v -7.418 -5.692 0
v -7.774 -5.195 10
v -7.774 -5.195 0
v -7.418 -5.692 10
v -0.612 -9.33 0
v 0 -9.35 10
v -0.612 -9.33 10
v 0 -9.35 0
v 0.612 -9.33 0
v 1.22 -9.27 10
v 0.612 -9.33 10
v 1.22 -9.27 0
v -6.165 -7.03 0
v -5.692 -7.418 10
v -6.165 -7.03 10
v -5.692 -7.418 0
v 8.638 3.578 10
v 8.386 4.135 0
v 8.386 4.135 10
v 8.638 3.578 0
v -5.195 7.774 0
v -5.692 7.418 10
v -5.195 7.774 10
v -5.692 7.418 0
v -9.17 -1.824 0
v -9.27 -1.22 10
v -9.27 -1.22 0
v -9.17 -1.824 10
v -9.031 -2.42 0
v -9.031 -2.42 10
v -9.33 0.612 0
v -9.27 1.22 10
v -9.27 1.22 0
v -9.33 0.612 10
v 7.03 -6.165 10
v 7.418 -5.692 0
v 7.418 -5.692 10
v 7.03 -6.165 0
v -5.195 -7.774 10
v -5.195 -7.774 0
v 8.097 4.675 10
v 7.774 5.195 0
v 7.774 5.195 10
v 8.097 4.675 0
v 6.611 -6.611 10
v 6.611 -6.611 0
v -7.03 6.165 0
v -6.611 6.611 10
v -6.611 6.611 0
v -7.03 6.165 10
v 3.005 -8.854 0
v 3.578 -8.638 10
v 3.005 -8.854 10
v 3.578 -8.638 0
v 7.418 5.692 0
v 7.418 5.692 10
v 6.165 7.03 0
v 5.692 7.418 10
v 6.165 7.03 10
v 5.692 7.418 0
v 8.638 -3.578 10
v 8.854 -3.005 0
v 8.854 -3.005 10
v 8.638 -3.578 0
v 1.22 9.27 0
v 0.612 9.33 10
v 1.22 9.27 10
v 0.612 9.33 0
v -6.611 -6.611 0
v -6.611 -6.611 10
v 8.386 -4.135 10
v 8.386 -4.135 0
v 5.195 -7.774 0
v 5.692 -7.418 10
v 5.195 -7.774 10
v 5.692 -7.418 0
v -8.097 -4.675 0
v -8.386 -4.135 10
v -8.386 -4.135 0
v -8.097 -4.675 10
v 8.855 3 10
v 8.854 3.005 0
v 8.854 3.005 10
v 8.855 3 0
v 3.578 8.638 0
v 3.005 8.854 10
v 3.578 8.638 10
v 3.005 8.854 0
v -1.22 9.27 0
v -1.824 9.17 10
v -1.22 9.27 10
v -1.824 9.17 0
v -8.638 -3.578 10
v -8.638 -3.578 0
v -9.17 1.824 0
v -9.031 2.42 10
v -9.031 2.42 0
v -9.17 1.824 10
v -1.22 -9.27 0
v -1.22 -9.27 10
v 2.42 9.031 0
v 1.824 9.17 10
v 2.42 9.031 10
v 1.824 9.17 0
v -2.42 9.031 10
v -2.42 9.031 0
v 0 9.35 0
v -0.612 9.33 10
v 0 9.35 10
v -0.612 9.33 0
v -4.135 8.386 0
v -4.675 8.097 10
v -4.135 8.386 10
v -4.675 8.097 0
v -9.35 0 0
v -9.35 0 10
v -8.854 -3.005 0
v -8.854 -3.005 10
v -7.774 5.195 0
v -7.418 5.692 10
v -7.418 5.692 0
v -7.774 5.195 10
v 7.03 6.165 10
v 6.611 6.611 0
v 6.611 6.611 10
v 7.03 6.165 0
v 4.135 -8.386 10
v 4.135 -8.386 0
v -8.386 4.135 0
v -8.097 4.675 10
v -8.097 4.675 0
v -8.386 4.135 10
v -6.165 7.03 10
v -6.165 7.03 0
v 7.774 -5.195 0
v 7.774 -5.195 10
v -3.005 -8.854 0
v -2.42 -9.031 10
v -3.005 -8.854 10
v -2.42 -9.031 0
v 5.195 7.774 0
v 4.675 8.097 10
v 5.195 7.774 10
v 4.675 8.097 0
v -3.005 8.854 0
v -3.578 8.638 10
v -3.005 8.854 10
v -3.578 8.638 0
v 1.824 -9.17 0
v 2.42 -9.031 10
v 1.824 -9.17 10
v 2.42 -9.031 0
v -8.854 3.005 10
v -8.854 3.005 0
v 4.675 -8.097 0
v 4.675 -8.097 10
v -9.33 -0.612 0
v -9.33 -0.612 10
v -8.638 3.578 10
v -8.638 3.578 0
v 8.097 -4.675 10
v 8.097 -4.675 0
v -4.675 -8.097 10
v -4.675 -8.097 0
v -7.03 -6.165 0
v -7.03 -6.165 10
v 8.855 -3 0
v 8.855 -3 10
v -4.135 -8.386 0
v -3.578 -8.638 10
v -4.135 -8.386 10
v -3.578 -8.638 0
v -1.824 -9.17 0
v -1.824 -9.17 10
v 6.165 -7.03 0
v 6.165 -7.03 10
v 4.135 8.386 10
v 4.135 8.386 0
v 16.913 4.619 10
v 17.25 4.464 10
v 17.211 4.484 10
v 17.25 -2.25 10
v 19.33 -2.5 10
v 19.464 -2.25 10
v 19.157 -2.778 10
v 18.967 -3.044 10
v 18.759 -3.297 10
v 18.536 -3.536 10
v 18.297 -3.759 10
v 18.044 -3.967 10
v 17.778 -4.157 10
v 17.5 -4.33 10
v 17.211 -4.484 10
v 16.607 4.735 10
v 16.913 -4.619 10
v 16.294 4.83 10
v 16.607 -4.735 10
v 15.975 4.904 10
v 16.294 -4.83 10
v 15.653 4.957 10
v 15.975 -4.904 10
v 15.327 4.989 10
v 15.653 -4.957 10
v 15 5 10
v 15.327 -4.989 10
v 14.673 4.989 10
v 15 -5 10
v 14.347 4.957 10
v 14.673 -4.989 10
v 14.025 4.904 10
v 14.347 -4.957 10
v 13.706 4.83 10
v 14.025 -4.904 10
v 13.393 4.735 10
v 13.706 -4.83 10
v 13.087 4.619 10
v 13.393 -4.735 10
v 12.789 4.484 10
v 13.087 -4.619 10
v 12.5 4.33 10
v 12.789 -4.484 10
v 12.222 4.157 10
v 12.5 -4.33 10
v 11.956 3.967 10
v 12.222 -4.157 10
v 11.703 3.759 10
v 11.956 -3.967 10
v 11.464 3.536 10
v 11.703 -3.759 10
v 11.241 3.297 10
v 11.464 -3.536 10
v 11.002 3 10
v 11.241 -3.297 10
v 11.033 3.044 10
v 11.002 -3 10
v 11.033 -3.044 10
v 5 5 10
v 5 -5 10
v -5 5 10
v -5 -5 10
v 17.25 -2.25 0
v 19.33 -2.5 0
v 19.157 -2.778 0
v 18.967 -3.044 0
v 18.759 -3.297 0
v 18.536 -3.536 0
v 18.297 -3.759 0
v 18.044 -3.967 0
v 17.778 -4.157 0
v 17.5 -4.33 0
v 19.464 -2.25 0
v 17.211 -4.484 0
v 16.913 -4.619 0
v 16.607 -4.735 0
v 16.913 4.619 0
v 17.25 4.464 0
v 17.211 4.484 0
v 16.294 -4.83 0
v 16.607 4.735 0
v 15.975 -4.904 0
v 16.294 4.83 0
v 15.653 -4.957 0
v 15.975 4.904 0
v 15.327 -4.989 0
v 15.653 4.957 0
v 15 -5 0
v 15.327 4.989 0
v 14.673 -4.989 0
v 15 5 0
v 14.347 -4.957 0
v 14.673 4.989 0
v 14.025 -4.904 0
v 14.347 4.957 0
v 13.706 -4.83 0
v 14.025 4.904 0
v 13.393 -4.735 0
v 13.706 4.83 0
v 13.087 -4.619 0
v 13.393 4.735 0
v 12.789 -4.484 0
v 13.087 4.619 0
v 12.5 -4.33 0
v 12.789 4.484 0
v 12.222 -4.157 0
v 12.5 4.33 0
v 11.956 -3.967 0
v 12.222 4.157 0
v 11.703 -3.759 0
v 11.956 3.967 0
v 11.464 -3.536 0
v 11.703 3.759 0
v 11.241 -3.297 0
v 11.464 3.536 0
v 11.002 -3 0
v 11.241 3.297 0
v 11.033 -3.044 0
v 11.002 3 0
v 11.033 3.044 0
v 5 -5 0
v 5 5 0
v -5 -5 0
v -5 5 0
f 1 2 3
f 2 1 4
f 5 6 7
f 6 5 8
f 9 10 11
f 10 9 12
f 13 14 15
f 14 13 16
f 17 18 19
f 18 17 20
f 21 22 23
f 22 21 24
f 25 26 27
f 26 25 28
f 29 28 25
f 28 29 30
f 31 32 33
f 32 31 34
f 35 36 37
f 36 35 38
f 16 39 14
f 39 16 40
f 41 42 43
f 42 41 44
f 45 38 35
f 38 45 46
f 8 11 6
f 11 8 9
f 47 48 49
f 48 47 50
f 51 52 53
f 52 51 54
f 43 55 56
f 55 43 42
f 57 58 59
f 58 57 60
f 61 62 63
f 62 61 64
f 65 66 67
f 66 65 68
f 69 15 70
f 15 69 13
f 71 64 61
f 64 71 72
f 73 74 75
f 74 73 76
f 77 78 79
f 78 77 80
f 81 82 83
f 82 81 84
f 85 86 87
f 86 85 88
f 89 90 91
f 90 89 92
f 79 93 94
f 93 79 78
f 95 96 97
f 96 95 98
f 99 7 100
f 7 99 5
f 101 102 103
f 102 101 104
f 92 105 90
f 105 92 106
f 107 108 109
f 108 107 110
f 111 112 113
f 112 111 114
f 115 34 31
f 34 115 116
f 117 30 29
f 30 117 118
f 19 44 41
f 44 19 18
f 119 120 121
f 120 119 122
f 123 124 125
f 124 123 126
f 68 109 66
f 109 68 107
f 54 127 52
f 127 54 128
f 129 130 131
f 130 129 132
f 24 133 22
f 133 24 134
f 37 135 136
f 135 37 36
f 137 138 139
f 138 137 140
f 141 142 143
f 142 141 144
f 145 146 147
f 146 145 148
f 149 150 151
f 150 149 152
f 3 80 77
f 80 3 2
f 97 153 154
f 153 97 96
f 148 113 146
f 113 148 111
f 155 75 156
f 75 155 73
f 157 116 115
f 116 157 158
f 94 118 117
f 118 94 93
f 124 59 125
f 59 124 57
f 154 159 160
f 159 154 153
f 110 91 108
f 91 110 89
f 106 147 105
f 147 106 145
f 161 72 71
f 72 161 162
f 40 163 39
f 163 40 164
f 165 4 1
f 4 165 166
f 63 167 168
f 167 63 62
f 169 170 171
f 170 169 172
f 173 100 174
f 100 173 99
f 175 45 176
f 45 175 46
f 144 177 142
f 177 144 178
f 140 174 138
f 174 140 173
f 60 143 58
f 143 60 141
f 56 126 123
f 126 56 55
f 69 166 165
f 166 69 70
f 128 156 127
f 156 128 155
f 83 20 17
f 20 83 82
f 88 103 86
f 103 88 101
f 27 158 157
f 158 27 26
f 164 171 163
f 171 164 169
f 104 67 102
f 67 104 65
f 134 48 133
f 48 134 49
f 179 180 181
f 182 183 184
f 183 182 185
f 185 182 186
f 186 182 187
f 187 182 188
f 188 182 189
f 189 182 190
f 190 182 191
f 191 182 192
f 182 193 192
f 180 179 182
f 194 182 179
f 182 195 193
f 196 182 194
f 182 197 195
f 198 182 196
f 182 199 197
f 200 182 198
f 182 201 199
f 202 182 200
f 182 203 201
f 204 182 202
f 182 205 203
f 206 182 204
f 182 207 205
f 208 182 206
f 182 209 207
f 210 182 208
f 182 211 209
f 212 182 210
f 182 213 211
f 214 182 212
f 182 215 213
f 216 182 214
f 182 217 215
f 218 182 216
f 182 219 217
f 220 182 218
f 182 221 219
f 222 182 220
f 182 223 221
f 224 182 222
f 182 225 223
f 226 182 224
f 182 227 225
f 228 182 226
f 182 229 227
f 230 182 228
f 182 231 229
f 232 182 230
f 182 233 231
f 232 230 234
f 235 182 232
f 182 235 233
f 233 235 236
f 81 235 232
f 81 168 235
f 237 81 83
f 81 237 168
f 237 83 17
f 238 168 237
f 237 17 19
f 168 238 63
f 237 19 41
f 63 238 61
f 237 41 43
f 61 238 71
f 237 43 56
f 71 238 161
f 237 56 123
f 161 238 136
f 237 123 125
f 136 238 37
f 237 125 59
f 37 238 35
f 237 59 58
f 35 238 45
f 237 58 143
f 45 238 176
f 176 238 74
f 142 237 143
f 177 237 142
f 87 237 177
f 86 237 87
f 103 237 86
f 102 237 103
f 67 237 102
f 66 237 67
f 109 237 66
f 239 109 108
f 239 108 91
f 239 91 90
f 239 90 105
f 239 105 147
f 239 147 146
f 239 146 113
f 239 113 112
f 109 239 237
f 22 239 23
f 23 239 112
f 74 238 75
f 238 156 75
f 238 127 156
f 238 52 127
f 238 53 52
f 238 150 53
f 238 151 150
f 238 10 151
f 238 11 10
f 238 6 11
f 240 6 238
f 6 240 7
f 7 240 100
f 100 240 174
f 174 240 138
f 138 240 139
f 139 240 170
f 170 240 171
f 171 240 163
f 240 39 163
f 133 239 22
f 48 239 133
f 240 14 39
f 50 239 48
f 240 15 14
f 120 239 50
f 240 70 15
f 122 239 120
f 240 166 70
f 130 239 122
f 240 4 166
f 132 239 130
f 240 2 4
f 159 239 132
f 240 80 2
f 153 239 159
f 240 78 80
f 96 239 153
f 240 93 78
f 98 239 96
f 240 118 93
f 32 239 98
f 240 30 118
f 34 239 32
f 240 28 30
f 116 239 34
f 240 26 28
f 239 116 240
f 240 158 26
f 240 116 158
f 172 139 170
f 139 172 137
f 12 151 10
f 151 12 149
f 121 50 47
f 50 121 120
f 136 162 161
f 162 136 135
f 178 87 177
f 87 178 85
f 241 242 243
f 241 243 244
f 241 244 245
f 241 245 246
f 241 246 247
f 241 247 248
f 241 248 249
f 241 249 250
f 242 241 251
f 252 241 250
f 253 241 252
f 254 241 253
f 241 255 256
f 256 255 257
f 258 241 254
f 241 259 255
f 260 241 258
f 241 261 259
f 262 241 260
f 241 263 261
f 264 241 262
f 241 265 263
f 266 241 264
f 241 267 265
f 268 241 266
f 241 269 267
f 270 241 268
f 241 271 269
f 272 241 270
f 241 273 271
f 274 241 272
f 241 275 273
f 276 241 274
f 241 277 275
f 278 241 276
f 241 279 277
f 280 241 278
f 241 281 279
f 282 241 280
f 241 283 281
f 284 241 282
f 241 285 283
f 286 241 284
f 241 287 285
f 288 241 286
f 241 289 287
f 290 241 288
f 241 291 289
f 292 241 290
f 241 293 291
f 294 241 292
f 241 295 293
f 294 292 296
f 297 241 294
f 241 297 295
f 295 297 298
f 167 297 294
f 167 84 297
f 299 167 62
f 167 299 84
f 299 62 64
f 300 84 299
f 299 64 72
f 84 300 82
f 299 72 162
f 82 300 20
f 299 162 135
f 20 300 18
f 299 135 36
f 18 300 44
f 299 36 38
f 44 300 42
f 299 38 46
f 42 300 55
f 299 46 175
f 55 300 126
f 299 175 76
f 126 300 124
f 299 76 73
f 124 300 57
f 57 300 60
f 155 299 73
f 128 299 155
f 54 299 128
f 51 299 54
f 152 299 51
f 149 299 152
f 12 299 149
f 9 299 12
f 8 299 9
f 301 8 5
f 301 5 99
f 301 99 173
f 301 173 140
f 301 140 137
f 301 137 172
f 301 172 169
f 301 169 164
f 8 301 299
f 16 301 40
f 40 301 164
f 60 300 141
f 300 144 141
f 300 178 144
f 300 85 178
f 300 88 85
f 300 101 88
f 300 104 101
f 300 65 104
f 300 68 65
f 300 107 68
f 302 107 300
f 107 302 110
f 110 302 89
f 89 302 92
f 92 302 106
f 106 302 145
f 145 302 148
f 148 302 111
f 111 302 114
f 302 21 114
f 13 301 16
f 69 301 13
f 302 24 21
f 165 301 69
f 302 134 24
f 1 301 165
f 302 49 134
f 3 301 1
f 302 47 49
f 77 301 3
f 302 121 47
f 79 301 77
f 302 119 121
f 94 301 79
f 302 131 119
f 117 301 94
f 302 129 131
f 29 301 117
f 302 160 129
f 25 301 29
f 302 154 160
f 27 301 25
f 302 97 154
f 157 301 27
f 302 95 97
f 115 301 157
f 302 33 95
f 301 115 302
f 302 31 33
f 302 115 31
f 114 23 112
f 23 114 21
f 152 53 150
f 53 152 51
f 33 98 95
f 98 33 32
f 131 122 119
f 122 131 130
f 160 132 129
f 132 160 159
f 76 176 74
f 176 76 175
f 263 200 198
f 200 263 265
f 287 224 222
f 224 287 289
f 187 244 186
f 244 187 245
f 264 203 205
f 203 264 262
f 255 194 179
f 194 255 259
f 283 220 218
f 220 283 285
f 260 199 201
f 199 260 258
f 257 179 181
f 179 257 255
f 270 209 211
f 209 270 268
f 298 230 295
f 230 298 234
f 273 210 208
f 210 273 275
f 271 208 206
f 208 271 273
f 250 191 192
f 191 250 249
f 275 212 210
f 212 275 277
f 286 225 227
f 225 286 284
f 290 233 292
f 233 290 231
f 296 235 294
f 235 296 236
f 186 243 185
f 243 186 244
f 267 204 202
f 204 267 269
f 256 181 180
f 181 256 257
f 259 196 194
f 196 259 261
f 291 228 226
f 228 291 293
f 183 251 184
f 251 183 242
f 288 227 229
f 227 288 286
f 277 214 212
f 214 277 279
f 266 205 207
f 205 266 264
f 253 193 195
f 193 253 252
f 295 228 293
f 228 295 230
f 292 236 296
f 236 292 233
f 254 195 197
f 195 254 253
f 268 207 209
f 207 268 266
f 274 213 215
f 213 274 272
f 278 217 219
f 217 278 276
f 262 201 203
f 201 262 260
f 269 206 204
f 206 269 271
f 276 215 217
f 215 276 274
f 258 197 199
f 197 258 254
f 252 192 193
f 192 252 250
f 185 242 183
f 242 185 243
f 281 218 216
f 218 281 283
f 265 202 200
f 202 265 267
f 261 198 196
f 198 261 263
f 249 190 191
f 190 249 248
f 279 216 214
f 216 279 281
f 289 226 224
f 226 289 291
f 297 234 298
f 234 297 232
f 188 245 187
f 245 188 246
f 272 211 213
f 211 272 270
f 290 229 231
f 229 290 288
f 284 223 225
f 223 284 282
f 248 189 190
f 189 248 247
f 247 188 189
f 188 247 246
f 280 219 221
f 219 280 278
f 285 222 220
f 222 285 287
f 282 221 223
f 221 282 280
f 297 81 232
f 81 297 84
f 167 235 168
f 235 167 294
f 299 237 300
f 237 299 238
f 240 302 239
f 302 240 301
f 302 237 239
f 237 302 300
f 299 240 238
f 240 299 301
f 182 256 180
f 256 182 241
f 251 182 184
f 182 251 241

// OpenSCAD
// Snap-on tubing clip for a 12.7 mm (1/2 inch) lab stand rod
// Print orientation: flat on the bed, z = 0 up to z = 10

// ---- Rod ring ----
rod_id     = 12.7;   // rod inner diameter
rod_wall   = 3;       // rod ring wall thickness
rod_outer  = rod_id + 2 * rod_wall;  // 18.7 mm
rod_open   = 10;      // width of opening on -X side

// ---- Tubing ring ----
tube_id    = 6;       // tubing inner diameter
tube_wall  = 2;       // tubing ring wall thickness
tube_outer = tube_id + 2 * tube_wall;  // 10 mm
tube_x     = 15;      // tubing ring centre X
tube_open  = 4.5;     // width of opening on +X side

// ---- Bridge ----
bridge_w   = 6;       // bridge width (Y)
bridge_x1  = 8;       // bridge start (X)
bridge_x2  = 12;      // bridge end (X)

// ---- Misc ----
eps        = 0.5;     // cutter overshoot
$fn        = 96;

difference() {
    union() {
        // Rod ring
        cylinder(d = rod_outer, h = 10);
        // Tubing ring
        translate([tube_x, 0, 0])
            cylinder(d = tube_outer, h = 10);
        // Bridge
        translate([bridge_x1, -bridge_w / 2, 0])
            cube([bridge_x2 - bridge_x1, bridge_w, 10]);
    }
    // Openings
    translate([-rod_open / 2, -rod_open / 2, -eps])
        cube([rod_open, rod_open, 10 + 2 * eps]);   // -X side of rod ring
    translate([tube_x + tube_open / 2, -tube_open / 2, -eps])
        cube([tube_open, tube_outer, 10 + 2 * eps]); // +X side of tubing ring
}
